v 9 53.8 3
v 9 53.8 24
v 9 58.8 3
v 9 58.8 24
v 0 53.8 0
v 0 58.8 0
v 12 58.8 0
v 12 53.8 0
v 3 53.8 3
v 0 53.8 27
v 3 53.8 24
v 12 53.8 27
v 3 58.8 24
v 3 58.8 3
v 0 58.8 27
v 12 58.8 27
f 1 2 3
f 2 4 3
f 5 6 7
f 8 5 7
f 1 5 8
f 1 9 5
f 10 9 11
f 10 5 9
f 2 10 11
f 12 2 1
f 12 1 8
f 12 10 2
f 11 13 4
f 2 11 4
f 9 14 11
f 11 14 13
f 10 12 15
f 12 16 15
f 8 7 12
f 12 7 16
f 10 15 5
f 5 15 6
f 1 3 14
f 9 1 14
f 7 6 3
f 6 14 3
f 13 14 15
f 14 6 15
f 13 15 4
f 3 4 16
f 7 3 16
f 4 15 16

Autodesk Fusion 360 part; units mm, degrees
sketch "Esboço1" plane through (0, 0, 0) normal (0, 0, 1) x (1, 0, 0)
  line L0 (0, 0) -> (28.4, 0)
  line L1 (28.4, 0) -> (28.4, 58.2)
  line L2 (28.4, 58.2) -> (0, 58.2)
  line L3 (0, 58.2) -> (0, 0)
  line L4 (-5.0078, -5.0078) -> (33.4078, -5.0078)
  line L5 (33.4078, -5.0078) -> (33.4078, 63.2078)
  line L6 (33.4078, 63.2078) -> (-5.0078, 63.2078)
  line L7 (-5.0078, 63.2078) -> (-5.0078, -5.0078)
  dimension "d1" = 28.4
  dimension "d2" = 58.2
  dimension "d3" = 5.0078
extrude "Extrusão1" add sketch "Esboço1" along normal blind 10 makes body 1
sketch "Esboço2" plane through (0, 0, 0) normal (0, 1, 0) x (-1, 0, 0)
  line L0 (-28.4, 0) -> (0, 0)
  line L1 (0, 0) -> (0, 10)
  line L2 (0, 10) -> (-28.4, 10)
  line L3 (-28.4, 10) -> (-28.4, 0)
  line L4 (-14.2, 0) -> (-17.2, 0)
  line L5 (-17.2, 0) -> (-17.2, 10)
  line L6 (-17.2, 10) -> (-14.2, 10)
  line L7 (-14.2, 10) -> (-14.2, 0)
  line L8 (-14.2, 0) -> (-11.2, 0)
  line L9 (-11.2, 0) -> (-11.2, 10)
  line L10 (-11.2, 10) -> (-14.2, 10)
  line L11 (-14.2, 10) -> (-14.2, 0)
  dimension "d6" = 3
extrude "Extrusão2" cut sketch "Esboço2" along normal blind -0.6 and the other way blind -58.8 contours L0 L2 L4 L5 L6 L7 L11 | L0 L2 L7 L8 L9 L10 L11 bodies 1
sketch "Esboço3" plane through (0, 58.8, 0) normal (0, -1, 0) x (1, 0, 0)
  line L0 (11.2, 0) -> (17.2, 0)
  line L1 (17.2, 0) -> (17.2, 10)
  line L2 (17.2, 10) -> (11.2, 10)
  line L3 (11.2, 10) -> (11.2, 0)
  line L4 (11.2, 5) -> (17.2, 5)
  line L5 (17.2, 4.9) -> (11.2, 4.9)
  line L6 (17.2, 5.1) -> (11.2, 5.1)
  line L7 (17.2, 5.1) -> (17.2, 4.9)
  line L8 (11.2, 5.1) -> (11.2, 4.9)
  dimension "d11" = 0.1
  dimension "d12" = 0.1
extrude "Extrusão4" cut sketch "Esboço3" against normal blind 0.3 contours L1 L3 L4 L5 L7 L8 | L1 L3 L4 L6 L7 L8 bodies 1
chamfer "Chanfro1" distance 1.2 distance2 0.3 2 edges at (14.2, 58.8, 5.1) (14.2, 58.8, 4.9) measured on face at (15.2, 58.8, 8.3667) measured on face at (15.2, 58.8, 3.2667) on bodies 1
sketch "Sketch5" plane through (0, 58.8, 0) normal (0, -1, 0) x (1, 0, 0)
  line L0 (0, 0) -> (12, 0)
  line L1 (12, 0) -> (12, 27)
  line L2 (12, 27) -> (0, 27)
  line L3 (0, 27) -> (0, 0)
  line L4 (9, 3) -> (3, 3)
  line L5 (3, 3) -> (3, 24)
  line L6 (3, 24) -> (9, 24)
  line L7 (9, 24) -> (9, 3)
  line L8 (9, 3) -> (3, 24) construction
  line L9 (3, 3) -> (9, 24) construction
  point P0 (6, 13.5)
  dimension "d25" = 12
  dimension "d26" = 27
  dimension "d27" = 6
  dimension "d28" = 21
extrude "Extrude6" add sketch "Sketch5" along normal blind 5 separate body makes body 2
sketch "Esboço4" plane through (0, -0.6, 0) normal (0, 1, 0) x (-1, 0, 0)
  line L0 (-17.2, 0) -> (-11.2, 0)
  line L1 (-11.2, 0) -> (-11.2, 10)
  line L2 (-11.2, 10) -> (-17.2, 10)
  line L3 (-17.2, 10) -> (-17.2, 0)
  line L4 (-11.2, 4.9) -> (-17.2, 4.9)
  line L5 (-11.2, 5.1) -> (-11.2, 4.9)
  line L6 (-11.2, 5.1) -> (-17.2, 5.1)
  line L7 (-17.2, 5) -> (-11.2, 5)
  line L8 (-17.2, 5.1) -> (-17.2, 4.9)
  dimension "d19" = 0.1
  dimension "d20" = 0.1
extrude "Extrusão5" cut sketch "Esboço4" against normal blind 0.3 contours L1 L3 L4 L5 L7 L8 | L1 L3 L5 L6 L7 L8 bodies 1
chamfer "Chanfro2" distance 1.2 distance2 0.3 2 edges at (14.2, -0.6, 4.9) (14.2, -0.6, 5.1) measured on face at (15.2, -0.6, 3.2667) measured on face at (15.2, -0.6, 6.7333) on bodies 1
hidden bodies 1
